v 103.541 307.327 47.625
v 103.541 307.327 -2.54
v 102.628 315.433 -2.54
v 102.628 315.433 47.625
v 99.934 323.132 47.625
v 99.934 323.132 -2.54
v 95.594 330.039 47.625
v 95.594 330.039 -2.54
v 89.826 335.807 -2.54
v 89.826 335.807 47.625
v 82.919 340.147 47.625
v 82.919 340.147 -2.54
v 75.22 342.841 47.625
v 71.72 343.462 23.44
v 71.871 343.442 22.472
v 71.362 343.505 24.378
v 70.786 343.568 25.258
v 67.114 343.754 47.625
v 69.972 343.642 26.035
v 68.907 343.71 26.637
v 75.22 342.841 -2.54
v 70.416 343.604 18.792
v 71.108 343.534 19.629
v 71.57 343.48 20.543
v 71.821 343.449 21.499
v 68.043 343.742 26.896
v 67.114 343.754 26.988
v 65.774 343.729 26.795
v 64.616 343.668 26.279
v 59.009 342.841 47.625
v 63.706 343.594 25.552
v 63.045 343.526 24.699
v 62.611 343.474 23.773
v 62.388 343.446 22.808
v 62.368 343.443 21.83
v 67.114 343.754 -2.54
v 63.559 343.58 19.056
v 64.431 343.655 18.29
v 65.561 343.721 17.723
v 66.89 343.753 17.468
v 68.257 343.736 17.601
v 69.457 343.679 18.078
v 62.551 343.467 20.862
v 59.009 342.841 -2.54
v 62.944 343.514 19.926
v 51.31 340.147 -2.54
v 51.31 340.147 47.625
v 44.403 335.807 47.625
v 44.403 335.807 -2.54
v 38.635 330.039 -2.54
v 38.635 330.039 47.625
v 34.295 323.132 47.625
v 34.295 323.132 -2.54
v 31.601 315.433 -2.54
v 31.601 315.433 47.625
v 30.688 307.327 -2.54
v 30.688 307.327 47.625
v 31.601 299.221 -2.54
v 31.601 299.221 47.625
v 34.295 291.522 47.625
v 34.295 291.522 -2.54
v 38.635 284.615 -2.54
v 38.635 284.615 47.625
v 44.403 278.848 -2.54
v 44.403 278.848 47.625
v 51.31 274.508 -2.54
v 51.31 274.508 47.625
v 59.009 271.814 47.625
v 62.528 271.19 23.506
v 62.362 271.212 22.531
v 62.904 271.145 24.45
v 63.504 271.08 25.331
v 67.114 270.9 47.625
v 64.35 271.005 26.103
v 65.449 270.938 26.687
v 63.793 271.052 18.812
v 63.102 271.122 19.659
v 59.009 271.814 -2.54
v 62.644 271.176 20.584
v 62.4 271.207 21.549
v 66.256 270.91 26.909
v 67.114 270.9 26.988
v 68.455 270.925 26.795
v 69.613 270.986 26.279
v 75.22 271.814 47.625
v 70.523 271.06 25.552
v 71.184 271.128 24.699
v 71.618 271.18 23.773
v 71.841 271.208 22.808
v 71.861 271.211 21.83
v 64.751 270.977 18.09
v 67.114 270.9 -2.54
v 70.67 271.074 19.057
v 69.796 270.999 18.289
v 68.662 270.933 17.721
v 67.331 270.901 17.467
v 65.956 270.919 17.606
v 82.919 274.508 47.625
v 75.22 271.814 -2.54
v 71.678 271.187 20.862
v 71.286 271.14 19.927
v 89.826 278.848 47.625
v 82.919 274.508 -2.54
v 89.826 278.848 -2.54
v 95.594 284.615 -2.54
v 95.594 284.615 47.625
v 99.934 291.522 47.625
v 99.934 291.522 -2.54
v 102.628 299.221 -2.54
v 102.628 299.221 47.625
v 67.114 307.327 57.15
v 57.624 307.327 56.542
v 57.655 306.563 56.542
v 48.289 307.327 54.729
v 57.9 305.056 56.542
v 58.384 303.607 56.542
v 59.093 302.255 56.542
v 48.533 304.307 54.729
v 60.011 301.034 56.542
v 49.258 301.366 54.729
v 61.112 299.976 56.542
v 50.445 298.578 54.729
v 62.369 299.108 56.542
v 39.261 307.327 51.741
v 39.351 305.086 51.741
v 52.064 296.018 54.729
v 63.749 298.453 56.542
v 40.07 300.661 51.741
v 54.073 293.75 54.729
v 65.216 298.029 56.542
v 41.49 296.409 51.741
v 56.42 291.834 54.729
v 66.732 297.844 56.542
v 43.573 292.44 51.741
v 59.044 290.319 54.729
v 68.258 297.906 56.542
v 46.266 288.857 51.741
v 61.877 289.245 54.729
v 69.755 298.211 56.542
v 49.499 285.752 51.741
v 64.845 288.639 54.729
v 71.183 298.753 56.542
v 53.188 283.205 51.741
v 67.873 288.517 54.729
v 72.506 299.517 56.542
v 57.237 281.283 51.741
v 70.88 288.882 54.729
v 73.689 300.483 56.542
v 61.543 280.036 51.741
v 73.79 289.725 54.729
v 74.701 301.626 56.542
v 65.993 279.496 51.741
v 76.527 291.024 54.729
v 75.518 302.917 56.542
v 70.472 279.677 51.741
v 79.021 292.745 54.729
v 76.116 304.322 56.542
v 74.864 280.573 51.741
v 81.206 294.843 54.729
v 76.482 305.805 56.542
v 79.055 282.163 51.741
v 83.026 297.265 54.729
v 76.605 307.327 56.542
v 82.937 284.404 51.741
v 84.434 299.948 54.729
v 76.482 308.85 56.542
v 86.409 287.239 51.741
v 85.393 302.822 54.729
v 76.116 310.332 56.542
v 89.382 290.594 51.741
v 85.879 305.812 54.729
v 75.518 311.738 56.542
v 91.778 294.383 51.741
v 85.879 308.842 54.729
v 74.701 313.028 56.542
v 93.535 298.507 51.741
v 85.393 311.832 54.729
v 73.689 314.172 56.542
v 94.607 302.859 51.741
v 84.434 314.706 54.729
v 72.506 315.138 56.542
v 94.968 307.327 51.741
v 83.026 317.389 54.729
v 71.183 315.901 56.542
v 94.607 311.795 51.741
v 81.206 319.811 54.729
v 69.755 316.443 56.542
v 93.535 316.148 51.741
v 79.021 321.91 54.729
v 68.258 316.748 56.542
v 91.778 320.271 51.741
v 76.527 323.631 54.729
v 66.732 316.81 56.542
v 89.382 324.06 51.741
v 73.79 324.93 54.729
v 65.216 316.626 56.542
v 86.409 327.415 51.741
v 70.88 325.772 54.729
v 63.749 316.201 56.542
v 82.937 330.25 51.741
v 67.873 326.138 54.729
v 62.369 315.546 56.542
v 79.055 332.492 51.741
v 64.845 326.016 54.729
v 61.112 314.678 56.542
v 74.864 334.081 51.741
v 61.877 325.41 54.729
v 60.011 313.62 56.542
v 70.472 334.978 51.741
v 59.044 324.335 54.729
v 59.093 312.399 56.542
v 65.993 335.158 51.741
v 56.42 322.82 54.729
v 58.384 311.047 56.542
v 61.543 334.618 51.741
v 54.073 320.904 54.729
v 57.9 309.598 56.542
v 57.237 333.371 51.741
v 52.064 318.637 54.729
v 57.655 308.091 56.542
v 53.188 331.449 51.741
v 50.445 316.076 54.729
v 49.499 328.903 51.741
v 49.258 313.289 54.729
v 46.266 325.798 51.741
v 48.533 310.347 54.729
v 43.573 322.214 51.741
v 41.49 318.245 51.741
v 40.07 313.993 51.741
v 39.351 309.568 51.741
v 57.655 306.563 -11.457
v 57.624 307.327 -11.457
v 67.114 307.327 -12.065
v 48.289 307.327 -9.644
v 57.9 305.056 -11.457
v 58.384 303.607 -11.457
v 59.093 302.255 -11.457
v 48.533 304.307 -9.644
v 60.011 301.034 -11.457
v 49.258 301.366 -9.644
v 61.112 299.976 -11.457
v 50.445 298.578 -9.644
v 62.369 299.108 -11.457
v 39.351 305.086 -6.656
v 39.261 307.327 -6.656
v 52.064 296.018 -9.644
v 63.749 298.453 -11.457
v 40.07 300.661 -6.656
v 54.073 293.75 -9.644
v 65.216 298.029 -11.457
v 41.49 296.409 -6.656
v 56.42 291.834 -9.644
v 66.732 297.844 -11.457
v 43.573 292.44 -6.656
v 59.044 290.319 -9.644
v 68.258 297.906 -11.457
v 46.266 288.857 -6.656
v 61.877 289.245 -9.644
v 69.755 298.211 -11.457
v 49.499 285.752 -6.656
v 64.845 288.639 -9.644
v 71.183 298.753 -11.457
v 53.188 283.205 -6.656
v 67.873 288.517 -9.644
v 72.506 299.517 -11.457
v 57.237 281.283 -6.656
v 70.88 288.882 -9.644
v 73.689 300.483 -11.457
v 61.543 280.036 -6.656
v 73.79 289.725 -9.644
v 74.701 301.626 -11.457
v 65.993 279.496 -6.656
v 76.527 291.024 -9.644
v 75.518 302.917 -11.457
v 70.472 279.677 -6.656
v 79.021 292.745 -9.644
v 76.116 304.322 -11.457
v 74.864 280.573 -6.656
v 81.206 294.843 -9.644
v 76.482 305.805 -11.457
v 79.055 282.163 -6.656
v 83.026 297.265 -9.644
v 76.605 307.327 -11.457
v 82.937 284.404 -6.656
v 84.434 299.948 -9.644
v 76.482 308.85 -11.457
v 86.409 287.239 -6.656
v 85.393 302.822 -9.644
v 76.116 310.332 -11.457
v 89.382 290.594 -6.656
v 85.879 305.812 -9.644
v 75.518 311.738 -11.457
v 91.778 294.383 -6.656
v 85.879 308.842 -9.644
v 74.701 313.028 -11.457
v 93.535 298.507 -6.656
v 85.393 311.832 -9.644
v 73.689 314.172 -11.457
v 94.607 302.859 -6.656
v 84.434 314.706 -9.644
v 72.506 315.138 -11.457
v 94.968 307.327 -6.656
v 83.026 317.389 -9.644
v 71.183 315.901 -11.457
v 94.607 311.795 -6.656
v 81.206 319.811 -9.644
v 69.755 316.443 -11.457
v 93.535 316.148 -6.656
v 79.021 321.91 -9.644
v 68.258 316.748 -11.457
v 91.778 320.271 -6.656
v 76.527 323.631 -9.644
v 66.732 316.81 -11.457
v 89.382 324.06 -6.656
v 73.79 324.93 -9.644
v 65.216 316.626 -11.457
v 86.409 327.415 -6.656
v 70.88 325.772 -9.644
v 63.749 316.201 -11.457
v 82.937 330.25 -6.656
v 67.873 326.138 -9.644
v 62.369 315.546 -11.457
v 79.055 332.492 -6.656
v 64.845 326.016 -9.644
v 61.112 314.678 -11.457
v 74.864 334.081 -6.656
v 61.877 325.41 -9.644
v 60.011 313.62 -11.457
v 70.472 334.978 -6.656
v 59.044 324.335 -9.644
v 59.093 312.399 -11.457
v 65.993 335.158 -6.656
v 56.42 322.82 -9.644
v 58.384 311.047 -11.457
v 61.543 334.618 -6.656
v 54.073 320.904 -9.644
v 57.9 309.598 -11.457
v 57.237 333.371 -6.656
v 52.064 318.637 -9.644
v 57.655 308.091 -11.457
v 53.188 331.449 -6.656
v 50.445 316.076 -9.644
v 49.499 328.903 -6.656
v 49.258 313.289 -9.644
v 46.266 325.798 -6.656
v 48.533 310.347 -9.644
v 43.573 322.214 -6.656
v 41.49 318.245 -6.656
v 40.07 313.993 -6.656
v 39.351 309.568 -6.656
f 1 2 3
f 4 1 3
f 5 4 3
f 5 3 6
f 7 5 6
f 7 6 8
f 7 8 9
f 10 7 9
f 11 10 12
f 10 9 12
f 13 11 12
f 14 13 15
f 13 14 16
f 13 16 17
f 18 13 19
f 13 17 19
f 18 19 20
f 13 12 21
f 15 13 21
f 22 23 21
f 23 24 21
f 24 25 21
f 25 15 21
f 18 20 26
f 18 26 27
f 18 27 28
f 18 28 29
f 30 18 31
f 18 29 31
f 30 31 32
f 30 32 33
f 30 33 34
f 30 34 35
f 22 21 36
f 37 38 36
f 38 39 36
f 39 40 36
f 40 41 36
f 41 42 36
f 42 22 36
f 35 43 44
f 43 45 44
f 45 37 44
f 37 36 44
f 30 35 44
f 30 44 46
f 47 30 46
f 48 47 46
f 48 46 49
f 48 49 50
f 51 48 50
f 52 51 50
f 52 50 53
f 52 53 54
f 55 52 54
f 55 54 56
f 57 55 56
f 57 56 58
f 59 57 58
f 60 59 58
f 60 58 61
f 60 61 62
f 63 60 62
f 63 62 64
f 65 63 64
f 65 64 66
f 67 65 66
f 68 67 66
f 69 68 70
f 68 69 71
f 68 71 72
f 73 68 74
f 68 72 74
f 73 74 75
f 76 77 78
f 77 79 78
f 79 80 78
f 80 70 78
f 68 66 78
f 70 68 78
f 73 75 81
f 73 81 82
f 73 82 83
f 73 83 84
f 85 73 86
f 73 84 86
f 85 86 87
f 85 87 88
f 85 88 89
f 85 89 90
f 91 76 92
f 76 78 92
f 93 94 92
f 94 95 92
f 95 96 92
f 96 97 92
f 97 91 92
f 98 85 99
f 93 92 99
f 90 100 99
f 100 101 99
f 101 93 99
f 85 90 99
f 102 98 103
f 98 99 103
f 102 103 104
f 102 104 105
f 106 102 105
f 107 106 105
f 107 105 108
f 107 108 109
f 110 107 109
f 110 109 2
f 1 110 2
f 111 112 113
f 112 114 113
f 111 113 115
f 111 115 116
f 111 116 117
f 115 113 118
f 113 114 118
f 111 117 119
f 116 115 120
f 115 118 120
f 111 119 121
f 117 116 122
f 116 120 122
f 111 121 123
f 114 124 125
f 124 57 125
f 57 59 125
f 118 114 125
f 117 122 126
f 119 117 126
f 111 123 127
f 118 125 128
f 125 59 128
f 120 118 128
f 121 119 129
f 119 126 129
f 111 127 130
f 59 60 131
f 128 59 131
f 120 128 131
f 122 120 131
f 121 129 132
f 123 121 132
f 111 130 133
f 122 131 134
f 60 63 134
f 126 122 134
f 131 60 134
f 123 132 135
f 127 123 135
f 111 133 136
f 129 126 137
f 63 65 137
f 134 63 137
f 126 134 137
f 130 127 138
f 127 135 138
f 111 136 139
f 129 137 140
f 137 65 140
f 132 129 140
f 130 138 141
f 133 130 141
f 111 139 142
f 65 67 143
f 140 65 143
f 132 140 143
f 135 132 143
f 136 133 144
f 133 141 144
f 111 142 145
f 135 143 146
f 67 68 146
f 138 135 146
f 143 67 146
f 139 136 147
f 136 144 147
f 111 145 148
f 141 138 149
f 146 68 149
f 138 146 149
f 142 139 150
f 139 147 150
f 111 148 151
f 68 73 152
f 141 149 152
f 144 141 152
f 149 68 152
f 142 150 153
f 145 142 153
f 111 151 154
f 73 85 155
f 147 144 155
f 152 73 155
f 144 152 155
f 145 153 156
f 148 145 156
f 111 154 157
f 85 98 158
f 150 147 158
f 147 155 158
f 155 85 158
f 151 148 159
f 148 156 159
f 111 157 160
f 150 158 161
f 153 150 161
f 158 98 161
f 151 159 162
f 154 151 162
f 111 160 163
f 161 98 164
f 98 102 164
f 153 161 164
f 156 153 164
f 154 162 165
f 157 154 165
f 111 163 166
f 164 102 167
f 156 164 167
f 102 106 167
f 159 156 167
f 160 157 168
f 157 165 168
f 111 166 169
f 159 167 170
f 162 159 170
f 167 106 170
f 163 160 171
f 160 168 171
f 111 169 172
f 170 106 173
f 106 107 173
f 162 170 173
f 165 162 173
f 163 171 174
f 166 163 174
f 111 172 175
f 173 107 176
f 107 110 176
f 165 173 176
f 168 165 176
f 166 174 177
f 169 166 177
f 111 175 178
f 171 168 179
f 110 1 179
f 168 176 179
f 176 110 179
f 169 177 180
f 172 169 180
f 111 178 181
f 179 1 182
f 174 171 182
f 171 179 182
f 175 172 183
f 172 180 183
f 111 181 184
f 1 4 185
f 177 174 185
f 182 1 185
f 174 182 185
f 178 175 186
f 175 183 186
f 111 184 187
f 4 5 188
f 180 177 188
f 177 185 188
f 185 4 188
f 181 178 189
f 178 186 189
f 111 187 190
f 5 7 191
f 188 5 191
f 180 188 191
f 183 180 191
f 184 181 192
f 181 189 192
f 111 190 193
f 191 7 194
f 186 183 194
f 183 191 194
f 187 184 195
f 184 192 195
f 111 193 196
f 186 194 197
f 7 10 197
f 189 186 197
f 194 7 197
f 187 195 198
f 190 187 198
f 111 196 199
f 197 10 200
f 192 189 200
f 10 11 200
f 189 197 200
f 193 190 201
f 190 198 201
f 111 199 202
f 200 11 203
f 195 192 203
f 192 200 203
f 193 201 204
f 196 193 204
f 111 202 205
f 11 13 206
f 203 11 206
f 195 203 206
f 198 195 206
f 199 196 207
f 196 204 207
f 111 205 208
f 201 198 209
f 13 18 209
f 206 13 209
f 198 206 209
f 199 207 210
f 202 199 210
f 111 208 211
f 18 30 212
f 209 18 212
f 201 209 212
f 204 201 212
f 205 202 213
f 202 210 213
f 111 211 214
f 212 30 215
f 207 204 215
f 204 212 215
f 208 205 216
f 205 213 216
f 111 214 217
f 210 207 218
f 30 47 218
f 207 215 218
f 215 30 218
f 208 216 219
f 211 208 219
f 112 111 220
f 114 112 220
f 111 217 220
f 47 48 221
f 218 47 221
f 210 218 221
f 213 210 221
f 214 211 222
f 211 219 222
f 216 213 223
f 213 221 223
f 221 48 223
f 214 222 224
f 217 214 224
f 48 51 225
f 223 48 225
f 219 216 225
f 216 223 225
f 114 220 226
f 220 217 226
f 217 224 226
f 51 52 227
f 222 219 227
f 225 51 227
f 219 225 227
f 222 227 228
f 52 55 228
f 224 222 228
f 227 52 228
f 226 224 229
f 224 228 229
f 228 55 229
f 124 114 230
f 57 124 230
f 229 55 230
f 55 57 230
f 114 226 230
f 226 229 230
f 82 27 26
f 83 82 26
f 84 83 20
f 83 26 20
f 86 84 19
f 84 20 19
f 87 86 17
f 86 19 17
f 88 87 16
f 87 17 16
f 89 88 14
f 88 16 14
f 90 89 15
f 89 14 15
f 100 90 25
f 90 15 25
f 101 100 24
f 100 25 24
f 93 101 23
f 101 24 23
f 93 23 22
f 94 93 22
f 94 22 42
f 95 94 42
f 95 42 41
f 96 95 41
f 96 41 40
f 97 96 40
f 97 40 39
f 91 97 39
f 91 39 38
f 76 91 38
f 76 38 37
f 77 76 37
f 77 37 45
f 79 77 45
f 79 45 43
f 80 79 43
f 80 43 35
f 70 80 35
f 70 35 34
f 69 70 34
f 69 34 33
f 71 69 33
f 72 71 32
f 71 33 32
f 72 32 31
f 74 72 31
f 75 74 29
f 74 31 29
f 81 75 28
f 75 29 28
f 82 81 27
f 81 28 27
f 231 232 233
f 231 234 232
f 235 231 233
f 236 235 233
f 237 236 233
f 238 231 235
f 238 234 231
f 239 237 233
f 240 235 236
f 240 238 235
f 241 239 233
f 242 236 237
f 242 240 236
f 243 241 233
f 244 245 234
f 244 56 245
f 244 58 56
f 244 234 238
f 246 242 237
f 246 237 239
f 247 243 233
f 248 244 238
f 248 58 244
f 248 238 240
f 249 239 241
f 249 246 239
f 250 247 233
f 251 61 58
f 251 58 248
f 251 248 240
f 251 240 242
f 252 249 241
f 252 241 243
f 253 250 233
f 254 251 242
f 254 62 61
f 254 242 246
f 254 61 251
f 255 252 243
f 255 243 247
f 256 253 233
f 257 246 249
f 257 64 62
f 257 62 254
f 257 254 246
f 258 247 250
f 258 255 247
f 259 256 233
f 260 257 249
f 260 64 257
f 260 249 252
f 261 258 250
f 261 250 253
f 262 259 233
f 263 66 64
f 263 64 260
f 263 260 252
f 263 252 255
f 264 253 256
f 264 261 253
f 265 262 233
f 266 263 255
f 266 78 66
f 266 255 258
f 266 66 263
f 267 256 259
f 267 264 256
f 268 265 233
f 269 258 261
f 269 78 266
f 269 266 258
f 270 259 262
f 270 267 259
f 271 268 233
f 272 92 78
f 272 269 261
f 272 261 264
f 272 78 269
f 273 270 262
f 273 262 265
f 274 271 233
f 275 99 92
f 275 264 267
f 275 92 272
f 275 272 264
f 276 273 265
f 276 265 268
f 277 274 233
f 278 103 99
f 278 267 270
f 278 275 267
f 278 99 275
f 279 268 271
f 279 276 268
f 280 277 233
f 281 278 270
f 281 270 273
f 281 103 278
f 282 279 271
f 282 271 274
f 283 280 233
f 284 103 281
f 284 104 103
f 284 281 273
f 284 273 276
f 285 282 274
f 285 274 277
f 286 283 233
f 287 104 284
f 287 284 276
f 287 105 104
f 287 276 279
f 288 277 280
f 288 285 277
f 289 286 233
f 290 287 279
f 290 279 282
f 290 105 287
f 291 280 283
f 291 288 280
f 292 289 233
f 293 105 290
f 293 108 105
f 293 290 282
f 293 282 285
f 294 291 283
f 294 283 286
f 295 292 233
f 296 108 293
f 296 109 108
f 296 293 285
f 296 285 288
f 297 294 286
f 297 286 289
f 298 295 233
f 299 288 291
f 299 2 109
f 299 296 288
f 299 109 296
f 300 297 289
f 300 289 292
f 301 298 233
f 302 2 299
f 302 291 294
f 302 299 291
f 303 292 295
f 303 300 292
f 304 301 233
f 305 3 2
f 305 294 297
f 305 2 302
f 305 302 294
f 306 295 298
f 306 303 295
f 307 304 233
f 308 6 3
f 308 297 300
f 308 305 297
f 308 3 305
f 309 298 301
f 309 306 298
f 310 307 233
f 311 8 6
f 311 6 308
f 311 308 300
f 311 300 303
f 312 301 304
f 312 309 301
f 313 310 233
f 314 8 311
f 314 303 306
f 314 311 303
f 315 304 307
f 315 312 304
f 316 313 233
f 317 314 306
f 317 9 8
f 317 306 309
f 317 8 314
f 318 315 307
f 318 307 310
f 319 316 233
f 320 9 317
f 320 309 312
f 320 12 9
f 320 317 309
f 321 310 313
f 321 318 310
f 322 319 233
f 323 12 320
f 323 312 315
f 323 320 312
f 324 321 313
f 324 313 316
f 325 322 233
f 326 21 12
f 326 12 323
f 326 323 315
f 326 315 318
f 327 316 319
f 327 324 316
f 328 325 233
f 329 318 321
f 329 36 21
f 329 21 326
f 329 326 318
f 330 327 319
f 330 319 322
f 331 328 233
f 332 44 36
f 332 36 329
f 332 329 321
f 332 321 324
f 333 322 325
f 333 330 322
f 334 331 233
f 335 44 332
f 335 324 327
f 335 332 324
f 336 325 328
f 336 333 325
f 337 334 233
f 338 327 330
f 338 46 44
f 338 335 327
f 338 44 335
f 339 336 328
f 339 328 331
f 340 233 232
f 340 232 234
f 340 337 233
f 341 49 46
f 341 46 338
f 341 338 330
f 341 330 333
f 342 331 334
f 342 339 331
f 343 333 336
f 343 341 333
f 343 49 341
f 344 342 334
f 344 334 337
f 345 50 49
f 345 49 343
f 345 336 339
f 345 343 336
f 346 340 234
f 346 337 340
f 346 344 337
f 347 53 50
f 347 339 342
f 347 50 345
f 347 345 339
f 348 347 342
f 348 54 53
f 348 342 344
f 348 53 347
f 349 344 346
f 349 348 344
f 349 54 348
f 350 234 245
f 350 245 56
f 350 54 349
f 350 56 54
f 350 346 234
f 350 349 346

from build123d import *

# Parameters (mm, degrees)
BOSS_EXTRUDE1_DEPTH      = 47.625
BOSS_EXTRUDE1_DEPTH_BACK = 2.54
SKETCH1_R                = 36.426767544
SKETCH4_R                = 4.7625
CUT_EXTRUDE1_DEPTH       = 139.904833197


with BuildPart() as part:
    # Sketch1 → Boss-Extrude1 (new, two sides: drawn at the far end of the back side and taken through both)
    with BuildSketch(Plane.XY.offset(-BOSS_EXTRUDE1_DEPTH_BACK)):
        with Locations((67.114492883, 307.327144707)):
            Circle(SKETCH1_R)
    extrude(amount=BOSS_EXTRUDE1_DEPTH + BOSS_EXTRUDE1_DEPTH_BACK)

    # Sketch3 → Revolve1 (revolve)
    with BuildSketch(Plane(origin=(67.114492883, 0, 0), x_dir=(0, 0, -1), z_dir=(1, 0, 0)), mode=Mode.PRIVATE) as revolve1_sk:
        with BuildLine():
            Line((-47.625, 307.327144707), (-57.15, 307.327144707))
            ThreePointArc((-57.15, 307.327144707), (-54.72938109, 326.152891828), (-47.625, 343.75391225))
            Line((-47.625, 343.75391225), (-47.625, 307.327144707))
        make_face()
        with BuildLine():
            Line((2.54, 307.327144707), (12.065, 307.327144707))
            ThreePointArc((12.065, 307.327144707), (9.64438109, 326.152891828), (2.54, 343.75391225))
            Line((2.54, 343.75391225), (2.54, 307.327144707))
        make_face()
    revolve(revolve1_sk.sketch.rotate(Axis((67.114492883, 307.327144707, 47.625), (0, 0, 1)), 90), axis=Axis((67.114492883, 307.327144707, 47.625), (0, 0, 1)))

    # Sketch4 → Cut-Extrude1 (cut, through all)
    with BuildSketch(Plane(origin=(0, 343.75391225, 0), x_dir=(1, 0, 0), z_dir=(0, 1, 0))):
        with Locations(Location((67.114492883, -22.225, 0), (0, 0, 270))):
            Circle(SKETCH4_R)
    extrude(amount=-CUT_EXTRUDE1_DEPTH, mode=Mode.SUBTRACT)


solid = part.part
